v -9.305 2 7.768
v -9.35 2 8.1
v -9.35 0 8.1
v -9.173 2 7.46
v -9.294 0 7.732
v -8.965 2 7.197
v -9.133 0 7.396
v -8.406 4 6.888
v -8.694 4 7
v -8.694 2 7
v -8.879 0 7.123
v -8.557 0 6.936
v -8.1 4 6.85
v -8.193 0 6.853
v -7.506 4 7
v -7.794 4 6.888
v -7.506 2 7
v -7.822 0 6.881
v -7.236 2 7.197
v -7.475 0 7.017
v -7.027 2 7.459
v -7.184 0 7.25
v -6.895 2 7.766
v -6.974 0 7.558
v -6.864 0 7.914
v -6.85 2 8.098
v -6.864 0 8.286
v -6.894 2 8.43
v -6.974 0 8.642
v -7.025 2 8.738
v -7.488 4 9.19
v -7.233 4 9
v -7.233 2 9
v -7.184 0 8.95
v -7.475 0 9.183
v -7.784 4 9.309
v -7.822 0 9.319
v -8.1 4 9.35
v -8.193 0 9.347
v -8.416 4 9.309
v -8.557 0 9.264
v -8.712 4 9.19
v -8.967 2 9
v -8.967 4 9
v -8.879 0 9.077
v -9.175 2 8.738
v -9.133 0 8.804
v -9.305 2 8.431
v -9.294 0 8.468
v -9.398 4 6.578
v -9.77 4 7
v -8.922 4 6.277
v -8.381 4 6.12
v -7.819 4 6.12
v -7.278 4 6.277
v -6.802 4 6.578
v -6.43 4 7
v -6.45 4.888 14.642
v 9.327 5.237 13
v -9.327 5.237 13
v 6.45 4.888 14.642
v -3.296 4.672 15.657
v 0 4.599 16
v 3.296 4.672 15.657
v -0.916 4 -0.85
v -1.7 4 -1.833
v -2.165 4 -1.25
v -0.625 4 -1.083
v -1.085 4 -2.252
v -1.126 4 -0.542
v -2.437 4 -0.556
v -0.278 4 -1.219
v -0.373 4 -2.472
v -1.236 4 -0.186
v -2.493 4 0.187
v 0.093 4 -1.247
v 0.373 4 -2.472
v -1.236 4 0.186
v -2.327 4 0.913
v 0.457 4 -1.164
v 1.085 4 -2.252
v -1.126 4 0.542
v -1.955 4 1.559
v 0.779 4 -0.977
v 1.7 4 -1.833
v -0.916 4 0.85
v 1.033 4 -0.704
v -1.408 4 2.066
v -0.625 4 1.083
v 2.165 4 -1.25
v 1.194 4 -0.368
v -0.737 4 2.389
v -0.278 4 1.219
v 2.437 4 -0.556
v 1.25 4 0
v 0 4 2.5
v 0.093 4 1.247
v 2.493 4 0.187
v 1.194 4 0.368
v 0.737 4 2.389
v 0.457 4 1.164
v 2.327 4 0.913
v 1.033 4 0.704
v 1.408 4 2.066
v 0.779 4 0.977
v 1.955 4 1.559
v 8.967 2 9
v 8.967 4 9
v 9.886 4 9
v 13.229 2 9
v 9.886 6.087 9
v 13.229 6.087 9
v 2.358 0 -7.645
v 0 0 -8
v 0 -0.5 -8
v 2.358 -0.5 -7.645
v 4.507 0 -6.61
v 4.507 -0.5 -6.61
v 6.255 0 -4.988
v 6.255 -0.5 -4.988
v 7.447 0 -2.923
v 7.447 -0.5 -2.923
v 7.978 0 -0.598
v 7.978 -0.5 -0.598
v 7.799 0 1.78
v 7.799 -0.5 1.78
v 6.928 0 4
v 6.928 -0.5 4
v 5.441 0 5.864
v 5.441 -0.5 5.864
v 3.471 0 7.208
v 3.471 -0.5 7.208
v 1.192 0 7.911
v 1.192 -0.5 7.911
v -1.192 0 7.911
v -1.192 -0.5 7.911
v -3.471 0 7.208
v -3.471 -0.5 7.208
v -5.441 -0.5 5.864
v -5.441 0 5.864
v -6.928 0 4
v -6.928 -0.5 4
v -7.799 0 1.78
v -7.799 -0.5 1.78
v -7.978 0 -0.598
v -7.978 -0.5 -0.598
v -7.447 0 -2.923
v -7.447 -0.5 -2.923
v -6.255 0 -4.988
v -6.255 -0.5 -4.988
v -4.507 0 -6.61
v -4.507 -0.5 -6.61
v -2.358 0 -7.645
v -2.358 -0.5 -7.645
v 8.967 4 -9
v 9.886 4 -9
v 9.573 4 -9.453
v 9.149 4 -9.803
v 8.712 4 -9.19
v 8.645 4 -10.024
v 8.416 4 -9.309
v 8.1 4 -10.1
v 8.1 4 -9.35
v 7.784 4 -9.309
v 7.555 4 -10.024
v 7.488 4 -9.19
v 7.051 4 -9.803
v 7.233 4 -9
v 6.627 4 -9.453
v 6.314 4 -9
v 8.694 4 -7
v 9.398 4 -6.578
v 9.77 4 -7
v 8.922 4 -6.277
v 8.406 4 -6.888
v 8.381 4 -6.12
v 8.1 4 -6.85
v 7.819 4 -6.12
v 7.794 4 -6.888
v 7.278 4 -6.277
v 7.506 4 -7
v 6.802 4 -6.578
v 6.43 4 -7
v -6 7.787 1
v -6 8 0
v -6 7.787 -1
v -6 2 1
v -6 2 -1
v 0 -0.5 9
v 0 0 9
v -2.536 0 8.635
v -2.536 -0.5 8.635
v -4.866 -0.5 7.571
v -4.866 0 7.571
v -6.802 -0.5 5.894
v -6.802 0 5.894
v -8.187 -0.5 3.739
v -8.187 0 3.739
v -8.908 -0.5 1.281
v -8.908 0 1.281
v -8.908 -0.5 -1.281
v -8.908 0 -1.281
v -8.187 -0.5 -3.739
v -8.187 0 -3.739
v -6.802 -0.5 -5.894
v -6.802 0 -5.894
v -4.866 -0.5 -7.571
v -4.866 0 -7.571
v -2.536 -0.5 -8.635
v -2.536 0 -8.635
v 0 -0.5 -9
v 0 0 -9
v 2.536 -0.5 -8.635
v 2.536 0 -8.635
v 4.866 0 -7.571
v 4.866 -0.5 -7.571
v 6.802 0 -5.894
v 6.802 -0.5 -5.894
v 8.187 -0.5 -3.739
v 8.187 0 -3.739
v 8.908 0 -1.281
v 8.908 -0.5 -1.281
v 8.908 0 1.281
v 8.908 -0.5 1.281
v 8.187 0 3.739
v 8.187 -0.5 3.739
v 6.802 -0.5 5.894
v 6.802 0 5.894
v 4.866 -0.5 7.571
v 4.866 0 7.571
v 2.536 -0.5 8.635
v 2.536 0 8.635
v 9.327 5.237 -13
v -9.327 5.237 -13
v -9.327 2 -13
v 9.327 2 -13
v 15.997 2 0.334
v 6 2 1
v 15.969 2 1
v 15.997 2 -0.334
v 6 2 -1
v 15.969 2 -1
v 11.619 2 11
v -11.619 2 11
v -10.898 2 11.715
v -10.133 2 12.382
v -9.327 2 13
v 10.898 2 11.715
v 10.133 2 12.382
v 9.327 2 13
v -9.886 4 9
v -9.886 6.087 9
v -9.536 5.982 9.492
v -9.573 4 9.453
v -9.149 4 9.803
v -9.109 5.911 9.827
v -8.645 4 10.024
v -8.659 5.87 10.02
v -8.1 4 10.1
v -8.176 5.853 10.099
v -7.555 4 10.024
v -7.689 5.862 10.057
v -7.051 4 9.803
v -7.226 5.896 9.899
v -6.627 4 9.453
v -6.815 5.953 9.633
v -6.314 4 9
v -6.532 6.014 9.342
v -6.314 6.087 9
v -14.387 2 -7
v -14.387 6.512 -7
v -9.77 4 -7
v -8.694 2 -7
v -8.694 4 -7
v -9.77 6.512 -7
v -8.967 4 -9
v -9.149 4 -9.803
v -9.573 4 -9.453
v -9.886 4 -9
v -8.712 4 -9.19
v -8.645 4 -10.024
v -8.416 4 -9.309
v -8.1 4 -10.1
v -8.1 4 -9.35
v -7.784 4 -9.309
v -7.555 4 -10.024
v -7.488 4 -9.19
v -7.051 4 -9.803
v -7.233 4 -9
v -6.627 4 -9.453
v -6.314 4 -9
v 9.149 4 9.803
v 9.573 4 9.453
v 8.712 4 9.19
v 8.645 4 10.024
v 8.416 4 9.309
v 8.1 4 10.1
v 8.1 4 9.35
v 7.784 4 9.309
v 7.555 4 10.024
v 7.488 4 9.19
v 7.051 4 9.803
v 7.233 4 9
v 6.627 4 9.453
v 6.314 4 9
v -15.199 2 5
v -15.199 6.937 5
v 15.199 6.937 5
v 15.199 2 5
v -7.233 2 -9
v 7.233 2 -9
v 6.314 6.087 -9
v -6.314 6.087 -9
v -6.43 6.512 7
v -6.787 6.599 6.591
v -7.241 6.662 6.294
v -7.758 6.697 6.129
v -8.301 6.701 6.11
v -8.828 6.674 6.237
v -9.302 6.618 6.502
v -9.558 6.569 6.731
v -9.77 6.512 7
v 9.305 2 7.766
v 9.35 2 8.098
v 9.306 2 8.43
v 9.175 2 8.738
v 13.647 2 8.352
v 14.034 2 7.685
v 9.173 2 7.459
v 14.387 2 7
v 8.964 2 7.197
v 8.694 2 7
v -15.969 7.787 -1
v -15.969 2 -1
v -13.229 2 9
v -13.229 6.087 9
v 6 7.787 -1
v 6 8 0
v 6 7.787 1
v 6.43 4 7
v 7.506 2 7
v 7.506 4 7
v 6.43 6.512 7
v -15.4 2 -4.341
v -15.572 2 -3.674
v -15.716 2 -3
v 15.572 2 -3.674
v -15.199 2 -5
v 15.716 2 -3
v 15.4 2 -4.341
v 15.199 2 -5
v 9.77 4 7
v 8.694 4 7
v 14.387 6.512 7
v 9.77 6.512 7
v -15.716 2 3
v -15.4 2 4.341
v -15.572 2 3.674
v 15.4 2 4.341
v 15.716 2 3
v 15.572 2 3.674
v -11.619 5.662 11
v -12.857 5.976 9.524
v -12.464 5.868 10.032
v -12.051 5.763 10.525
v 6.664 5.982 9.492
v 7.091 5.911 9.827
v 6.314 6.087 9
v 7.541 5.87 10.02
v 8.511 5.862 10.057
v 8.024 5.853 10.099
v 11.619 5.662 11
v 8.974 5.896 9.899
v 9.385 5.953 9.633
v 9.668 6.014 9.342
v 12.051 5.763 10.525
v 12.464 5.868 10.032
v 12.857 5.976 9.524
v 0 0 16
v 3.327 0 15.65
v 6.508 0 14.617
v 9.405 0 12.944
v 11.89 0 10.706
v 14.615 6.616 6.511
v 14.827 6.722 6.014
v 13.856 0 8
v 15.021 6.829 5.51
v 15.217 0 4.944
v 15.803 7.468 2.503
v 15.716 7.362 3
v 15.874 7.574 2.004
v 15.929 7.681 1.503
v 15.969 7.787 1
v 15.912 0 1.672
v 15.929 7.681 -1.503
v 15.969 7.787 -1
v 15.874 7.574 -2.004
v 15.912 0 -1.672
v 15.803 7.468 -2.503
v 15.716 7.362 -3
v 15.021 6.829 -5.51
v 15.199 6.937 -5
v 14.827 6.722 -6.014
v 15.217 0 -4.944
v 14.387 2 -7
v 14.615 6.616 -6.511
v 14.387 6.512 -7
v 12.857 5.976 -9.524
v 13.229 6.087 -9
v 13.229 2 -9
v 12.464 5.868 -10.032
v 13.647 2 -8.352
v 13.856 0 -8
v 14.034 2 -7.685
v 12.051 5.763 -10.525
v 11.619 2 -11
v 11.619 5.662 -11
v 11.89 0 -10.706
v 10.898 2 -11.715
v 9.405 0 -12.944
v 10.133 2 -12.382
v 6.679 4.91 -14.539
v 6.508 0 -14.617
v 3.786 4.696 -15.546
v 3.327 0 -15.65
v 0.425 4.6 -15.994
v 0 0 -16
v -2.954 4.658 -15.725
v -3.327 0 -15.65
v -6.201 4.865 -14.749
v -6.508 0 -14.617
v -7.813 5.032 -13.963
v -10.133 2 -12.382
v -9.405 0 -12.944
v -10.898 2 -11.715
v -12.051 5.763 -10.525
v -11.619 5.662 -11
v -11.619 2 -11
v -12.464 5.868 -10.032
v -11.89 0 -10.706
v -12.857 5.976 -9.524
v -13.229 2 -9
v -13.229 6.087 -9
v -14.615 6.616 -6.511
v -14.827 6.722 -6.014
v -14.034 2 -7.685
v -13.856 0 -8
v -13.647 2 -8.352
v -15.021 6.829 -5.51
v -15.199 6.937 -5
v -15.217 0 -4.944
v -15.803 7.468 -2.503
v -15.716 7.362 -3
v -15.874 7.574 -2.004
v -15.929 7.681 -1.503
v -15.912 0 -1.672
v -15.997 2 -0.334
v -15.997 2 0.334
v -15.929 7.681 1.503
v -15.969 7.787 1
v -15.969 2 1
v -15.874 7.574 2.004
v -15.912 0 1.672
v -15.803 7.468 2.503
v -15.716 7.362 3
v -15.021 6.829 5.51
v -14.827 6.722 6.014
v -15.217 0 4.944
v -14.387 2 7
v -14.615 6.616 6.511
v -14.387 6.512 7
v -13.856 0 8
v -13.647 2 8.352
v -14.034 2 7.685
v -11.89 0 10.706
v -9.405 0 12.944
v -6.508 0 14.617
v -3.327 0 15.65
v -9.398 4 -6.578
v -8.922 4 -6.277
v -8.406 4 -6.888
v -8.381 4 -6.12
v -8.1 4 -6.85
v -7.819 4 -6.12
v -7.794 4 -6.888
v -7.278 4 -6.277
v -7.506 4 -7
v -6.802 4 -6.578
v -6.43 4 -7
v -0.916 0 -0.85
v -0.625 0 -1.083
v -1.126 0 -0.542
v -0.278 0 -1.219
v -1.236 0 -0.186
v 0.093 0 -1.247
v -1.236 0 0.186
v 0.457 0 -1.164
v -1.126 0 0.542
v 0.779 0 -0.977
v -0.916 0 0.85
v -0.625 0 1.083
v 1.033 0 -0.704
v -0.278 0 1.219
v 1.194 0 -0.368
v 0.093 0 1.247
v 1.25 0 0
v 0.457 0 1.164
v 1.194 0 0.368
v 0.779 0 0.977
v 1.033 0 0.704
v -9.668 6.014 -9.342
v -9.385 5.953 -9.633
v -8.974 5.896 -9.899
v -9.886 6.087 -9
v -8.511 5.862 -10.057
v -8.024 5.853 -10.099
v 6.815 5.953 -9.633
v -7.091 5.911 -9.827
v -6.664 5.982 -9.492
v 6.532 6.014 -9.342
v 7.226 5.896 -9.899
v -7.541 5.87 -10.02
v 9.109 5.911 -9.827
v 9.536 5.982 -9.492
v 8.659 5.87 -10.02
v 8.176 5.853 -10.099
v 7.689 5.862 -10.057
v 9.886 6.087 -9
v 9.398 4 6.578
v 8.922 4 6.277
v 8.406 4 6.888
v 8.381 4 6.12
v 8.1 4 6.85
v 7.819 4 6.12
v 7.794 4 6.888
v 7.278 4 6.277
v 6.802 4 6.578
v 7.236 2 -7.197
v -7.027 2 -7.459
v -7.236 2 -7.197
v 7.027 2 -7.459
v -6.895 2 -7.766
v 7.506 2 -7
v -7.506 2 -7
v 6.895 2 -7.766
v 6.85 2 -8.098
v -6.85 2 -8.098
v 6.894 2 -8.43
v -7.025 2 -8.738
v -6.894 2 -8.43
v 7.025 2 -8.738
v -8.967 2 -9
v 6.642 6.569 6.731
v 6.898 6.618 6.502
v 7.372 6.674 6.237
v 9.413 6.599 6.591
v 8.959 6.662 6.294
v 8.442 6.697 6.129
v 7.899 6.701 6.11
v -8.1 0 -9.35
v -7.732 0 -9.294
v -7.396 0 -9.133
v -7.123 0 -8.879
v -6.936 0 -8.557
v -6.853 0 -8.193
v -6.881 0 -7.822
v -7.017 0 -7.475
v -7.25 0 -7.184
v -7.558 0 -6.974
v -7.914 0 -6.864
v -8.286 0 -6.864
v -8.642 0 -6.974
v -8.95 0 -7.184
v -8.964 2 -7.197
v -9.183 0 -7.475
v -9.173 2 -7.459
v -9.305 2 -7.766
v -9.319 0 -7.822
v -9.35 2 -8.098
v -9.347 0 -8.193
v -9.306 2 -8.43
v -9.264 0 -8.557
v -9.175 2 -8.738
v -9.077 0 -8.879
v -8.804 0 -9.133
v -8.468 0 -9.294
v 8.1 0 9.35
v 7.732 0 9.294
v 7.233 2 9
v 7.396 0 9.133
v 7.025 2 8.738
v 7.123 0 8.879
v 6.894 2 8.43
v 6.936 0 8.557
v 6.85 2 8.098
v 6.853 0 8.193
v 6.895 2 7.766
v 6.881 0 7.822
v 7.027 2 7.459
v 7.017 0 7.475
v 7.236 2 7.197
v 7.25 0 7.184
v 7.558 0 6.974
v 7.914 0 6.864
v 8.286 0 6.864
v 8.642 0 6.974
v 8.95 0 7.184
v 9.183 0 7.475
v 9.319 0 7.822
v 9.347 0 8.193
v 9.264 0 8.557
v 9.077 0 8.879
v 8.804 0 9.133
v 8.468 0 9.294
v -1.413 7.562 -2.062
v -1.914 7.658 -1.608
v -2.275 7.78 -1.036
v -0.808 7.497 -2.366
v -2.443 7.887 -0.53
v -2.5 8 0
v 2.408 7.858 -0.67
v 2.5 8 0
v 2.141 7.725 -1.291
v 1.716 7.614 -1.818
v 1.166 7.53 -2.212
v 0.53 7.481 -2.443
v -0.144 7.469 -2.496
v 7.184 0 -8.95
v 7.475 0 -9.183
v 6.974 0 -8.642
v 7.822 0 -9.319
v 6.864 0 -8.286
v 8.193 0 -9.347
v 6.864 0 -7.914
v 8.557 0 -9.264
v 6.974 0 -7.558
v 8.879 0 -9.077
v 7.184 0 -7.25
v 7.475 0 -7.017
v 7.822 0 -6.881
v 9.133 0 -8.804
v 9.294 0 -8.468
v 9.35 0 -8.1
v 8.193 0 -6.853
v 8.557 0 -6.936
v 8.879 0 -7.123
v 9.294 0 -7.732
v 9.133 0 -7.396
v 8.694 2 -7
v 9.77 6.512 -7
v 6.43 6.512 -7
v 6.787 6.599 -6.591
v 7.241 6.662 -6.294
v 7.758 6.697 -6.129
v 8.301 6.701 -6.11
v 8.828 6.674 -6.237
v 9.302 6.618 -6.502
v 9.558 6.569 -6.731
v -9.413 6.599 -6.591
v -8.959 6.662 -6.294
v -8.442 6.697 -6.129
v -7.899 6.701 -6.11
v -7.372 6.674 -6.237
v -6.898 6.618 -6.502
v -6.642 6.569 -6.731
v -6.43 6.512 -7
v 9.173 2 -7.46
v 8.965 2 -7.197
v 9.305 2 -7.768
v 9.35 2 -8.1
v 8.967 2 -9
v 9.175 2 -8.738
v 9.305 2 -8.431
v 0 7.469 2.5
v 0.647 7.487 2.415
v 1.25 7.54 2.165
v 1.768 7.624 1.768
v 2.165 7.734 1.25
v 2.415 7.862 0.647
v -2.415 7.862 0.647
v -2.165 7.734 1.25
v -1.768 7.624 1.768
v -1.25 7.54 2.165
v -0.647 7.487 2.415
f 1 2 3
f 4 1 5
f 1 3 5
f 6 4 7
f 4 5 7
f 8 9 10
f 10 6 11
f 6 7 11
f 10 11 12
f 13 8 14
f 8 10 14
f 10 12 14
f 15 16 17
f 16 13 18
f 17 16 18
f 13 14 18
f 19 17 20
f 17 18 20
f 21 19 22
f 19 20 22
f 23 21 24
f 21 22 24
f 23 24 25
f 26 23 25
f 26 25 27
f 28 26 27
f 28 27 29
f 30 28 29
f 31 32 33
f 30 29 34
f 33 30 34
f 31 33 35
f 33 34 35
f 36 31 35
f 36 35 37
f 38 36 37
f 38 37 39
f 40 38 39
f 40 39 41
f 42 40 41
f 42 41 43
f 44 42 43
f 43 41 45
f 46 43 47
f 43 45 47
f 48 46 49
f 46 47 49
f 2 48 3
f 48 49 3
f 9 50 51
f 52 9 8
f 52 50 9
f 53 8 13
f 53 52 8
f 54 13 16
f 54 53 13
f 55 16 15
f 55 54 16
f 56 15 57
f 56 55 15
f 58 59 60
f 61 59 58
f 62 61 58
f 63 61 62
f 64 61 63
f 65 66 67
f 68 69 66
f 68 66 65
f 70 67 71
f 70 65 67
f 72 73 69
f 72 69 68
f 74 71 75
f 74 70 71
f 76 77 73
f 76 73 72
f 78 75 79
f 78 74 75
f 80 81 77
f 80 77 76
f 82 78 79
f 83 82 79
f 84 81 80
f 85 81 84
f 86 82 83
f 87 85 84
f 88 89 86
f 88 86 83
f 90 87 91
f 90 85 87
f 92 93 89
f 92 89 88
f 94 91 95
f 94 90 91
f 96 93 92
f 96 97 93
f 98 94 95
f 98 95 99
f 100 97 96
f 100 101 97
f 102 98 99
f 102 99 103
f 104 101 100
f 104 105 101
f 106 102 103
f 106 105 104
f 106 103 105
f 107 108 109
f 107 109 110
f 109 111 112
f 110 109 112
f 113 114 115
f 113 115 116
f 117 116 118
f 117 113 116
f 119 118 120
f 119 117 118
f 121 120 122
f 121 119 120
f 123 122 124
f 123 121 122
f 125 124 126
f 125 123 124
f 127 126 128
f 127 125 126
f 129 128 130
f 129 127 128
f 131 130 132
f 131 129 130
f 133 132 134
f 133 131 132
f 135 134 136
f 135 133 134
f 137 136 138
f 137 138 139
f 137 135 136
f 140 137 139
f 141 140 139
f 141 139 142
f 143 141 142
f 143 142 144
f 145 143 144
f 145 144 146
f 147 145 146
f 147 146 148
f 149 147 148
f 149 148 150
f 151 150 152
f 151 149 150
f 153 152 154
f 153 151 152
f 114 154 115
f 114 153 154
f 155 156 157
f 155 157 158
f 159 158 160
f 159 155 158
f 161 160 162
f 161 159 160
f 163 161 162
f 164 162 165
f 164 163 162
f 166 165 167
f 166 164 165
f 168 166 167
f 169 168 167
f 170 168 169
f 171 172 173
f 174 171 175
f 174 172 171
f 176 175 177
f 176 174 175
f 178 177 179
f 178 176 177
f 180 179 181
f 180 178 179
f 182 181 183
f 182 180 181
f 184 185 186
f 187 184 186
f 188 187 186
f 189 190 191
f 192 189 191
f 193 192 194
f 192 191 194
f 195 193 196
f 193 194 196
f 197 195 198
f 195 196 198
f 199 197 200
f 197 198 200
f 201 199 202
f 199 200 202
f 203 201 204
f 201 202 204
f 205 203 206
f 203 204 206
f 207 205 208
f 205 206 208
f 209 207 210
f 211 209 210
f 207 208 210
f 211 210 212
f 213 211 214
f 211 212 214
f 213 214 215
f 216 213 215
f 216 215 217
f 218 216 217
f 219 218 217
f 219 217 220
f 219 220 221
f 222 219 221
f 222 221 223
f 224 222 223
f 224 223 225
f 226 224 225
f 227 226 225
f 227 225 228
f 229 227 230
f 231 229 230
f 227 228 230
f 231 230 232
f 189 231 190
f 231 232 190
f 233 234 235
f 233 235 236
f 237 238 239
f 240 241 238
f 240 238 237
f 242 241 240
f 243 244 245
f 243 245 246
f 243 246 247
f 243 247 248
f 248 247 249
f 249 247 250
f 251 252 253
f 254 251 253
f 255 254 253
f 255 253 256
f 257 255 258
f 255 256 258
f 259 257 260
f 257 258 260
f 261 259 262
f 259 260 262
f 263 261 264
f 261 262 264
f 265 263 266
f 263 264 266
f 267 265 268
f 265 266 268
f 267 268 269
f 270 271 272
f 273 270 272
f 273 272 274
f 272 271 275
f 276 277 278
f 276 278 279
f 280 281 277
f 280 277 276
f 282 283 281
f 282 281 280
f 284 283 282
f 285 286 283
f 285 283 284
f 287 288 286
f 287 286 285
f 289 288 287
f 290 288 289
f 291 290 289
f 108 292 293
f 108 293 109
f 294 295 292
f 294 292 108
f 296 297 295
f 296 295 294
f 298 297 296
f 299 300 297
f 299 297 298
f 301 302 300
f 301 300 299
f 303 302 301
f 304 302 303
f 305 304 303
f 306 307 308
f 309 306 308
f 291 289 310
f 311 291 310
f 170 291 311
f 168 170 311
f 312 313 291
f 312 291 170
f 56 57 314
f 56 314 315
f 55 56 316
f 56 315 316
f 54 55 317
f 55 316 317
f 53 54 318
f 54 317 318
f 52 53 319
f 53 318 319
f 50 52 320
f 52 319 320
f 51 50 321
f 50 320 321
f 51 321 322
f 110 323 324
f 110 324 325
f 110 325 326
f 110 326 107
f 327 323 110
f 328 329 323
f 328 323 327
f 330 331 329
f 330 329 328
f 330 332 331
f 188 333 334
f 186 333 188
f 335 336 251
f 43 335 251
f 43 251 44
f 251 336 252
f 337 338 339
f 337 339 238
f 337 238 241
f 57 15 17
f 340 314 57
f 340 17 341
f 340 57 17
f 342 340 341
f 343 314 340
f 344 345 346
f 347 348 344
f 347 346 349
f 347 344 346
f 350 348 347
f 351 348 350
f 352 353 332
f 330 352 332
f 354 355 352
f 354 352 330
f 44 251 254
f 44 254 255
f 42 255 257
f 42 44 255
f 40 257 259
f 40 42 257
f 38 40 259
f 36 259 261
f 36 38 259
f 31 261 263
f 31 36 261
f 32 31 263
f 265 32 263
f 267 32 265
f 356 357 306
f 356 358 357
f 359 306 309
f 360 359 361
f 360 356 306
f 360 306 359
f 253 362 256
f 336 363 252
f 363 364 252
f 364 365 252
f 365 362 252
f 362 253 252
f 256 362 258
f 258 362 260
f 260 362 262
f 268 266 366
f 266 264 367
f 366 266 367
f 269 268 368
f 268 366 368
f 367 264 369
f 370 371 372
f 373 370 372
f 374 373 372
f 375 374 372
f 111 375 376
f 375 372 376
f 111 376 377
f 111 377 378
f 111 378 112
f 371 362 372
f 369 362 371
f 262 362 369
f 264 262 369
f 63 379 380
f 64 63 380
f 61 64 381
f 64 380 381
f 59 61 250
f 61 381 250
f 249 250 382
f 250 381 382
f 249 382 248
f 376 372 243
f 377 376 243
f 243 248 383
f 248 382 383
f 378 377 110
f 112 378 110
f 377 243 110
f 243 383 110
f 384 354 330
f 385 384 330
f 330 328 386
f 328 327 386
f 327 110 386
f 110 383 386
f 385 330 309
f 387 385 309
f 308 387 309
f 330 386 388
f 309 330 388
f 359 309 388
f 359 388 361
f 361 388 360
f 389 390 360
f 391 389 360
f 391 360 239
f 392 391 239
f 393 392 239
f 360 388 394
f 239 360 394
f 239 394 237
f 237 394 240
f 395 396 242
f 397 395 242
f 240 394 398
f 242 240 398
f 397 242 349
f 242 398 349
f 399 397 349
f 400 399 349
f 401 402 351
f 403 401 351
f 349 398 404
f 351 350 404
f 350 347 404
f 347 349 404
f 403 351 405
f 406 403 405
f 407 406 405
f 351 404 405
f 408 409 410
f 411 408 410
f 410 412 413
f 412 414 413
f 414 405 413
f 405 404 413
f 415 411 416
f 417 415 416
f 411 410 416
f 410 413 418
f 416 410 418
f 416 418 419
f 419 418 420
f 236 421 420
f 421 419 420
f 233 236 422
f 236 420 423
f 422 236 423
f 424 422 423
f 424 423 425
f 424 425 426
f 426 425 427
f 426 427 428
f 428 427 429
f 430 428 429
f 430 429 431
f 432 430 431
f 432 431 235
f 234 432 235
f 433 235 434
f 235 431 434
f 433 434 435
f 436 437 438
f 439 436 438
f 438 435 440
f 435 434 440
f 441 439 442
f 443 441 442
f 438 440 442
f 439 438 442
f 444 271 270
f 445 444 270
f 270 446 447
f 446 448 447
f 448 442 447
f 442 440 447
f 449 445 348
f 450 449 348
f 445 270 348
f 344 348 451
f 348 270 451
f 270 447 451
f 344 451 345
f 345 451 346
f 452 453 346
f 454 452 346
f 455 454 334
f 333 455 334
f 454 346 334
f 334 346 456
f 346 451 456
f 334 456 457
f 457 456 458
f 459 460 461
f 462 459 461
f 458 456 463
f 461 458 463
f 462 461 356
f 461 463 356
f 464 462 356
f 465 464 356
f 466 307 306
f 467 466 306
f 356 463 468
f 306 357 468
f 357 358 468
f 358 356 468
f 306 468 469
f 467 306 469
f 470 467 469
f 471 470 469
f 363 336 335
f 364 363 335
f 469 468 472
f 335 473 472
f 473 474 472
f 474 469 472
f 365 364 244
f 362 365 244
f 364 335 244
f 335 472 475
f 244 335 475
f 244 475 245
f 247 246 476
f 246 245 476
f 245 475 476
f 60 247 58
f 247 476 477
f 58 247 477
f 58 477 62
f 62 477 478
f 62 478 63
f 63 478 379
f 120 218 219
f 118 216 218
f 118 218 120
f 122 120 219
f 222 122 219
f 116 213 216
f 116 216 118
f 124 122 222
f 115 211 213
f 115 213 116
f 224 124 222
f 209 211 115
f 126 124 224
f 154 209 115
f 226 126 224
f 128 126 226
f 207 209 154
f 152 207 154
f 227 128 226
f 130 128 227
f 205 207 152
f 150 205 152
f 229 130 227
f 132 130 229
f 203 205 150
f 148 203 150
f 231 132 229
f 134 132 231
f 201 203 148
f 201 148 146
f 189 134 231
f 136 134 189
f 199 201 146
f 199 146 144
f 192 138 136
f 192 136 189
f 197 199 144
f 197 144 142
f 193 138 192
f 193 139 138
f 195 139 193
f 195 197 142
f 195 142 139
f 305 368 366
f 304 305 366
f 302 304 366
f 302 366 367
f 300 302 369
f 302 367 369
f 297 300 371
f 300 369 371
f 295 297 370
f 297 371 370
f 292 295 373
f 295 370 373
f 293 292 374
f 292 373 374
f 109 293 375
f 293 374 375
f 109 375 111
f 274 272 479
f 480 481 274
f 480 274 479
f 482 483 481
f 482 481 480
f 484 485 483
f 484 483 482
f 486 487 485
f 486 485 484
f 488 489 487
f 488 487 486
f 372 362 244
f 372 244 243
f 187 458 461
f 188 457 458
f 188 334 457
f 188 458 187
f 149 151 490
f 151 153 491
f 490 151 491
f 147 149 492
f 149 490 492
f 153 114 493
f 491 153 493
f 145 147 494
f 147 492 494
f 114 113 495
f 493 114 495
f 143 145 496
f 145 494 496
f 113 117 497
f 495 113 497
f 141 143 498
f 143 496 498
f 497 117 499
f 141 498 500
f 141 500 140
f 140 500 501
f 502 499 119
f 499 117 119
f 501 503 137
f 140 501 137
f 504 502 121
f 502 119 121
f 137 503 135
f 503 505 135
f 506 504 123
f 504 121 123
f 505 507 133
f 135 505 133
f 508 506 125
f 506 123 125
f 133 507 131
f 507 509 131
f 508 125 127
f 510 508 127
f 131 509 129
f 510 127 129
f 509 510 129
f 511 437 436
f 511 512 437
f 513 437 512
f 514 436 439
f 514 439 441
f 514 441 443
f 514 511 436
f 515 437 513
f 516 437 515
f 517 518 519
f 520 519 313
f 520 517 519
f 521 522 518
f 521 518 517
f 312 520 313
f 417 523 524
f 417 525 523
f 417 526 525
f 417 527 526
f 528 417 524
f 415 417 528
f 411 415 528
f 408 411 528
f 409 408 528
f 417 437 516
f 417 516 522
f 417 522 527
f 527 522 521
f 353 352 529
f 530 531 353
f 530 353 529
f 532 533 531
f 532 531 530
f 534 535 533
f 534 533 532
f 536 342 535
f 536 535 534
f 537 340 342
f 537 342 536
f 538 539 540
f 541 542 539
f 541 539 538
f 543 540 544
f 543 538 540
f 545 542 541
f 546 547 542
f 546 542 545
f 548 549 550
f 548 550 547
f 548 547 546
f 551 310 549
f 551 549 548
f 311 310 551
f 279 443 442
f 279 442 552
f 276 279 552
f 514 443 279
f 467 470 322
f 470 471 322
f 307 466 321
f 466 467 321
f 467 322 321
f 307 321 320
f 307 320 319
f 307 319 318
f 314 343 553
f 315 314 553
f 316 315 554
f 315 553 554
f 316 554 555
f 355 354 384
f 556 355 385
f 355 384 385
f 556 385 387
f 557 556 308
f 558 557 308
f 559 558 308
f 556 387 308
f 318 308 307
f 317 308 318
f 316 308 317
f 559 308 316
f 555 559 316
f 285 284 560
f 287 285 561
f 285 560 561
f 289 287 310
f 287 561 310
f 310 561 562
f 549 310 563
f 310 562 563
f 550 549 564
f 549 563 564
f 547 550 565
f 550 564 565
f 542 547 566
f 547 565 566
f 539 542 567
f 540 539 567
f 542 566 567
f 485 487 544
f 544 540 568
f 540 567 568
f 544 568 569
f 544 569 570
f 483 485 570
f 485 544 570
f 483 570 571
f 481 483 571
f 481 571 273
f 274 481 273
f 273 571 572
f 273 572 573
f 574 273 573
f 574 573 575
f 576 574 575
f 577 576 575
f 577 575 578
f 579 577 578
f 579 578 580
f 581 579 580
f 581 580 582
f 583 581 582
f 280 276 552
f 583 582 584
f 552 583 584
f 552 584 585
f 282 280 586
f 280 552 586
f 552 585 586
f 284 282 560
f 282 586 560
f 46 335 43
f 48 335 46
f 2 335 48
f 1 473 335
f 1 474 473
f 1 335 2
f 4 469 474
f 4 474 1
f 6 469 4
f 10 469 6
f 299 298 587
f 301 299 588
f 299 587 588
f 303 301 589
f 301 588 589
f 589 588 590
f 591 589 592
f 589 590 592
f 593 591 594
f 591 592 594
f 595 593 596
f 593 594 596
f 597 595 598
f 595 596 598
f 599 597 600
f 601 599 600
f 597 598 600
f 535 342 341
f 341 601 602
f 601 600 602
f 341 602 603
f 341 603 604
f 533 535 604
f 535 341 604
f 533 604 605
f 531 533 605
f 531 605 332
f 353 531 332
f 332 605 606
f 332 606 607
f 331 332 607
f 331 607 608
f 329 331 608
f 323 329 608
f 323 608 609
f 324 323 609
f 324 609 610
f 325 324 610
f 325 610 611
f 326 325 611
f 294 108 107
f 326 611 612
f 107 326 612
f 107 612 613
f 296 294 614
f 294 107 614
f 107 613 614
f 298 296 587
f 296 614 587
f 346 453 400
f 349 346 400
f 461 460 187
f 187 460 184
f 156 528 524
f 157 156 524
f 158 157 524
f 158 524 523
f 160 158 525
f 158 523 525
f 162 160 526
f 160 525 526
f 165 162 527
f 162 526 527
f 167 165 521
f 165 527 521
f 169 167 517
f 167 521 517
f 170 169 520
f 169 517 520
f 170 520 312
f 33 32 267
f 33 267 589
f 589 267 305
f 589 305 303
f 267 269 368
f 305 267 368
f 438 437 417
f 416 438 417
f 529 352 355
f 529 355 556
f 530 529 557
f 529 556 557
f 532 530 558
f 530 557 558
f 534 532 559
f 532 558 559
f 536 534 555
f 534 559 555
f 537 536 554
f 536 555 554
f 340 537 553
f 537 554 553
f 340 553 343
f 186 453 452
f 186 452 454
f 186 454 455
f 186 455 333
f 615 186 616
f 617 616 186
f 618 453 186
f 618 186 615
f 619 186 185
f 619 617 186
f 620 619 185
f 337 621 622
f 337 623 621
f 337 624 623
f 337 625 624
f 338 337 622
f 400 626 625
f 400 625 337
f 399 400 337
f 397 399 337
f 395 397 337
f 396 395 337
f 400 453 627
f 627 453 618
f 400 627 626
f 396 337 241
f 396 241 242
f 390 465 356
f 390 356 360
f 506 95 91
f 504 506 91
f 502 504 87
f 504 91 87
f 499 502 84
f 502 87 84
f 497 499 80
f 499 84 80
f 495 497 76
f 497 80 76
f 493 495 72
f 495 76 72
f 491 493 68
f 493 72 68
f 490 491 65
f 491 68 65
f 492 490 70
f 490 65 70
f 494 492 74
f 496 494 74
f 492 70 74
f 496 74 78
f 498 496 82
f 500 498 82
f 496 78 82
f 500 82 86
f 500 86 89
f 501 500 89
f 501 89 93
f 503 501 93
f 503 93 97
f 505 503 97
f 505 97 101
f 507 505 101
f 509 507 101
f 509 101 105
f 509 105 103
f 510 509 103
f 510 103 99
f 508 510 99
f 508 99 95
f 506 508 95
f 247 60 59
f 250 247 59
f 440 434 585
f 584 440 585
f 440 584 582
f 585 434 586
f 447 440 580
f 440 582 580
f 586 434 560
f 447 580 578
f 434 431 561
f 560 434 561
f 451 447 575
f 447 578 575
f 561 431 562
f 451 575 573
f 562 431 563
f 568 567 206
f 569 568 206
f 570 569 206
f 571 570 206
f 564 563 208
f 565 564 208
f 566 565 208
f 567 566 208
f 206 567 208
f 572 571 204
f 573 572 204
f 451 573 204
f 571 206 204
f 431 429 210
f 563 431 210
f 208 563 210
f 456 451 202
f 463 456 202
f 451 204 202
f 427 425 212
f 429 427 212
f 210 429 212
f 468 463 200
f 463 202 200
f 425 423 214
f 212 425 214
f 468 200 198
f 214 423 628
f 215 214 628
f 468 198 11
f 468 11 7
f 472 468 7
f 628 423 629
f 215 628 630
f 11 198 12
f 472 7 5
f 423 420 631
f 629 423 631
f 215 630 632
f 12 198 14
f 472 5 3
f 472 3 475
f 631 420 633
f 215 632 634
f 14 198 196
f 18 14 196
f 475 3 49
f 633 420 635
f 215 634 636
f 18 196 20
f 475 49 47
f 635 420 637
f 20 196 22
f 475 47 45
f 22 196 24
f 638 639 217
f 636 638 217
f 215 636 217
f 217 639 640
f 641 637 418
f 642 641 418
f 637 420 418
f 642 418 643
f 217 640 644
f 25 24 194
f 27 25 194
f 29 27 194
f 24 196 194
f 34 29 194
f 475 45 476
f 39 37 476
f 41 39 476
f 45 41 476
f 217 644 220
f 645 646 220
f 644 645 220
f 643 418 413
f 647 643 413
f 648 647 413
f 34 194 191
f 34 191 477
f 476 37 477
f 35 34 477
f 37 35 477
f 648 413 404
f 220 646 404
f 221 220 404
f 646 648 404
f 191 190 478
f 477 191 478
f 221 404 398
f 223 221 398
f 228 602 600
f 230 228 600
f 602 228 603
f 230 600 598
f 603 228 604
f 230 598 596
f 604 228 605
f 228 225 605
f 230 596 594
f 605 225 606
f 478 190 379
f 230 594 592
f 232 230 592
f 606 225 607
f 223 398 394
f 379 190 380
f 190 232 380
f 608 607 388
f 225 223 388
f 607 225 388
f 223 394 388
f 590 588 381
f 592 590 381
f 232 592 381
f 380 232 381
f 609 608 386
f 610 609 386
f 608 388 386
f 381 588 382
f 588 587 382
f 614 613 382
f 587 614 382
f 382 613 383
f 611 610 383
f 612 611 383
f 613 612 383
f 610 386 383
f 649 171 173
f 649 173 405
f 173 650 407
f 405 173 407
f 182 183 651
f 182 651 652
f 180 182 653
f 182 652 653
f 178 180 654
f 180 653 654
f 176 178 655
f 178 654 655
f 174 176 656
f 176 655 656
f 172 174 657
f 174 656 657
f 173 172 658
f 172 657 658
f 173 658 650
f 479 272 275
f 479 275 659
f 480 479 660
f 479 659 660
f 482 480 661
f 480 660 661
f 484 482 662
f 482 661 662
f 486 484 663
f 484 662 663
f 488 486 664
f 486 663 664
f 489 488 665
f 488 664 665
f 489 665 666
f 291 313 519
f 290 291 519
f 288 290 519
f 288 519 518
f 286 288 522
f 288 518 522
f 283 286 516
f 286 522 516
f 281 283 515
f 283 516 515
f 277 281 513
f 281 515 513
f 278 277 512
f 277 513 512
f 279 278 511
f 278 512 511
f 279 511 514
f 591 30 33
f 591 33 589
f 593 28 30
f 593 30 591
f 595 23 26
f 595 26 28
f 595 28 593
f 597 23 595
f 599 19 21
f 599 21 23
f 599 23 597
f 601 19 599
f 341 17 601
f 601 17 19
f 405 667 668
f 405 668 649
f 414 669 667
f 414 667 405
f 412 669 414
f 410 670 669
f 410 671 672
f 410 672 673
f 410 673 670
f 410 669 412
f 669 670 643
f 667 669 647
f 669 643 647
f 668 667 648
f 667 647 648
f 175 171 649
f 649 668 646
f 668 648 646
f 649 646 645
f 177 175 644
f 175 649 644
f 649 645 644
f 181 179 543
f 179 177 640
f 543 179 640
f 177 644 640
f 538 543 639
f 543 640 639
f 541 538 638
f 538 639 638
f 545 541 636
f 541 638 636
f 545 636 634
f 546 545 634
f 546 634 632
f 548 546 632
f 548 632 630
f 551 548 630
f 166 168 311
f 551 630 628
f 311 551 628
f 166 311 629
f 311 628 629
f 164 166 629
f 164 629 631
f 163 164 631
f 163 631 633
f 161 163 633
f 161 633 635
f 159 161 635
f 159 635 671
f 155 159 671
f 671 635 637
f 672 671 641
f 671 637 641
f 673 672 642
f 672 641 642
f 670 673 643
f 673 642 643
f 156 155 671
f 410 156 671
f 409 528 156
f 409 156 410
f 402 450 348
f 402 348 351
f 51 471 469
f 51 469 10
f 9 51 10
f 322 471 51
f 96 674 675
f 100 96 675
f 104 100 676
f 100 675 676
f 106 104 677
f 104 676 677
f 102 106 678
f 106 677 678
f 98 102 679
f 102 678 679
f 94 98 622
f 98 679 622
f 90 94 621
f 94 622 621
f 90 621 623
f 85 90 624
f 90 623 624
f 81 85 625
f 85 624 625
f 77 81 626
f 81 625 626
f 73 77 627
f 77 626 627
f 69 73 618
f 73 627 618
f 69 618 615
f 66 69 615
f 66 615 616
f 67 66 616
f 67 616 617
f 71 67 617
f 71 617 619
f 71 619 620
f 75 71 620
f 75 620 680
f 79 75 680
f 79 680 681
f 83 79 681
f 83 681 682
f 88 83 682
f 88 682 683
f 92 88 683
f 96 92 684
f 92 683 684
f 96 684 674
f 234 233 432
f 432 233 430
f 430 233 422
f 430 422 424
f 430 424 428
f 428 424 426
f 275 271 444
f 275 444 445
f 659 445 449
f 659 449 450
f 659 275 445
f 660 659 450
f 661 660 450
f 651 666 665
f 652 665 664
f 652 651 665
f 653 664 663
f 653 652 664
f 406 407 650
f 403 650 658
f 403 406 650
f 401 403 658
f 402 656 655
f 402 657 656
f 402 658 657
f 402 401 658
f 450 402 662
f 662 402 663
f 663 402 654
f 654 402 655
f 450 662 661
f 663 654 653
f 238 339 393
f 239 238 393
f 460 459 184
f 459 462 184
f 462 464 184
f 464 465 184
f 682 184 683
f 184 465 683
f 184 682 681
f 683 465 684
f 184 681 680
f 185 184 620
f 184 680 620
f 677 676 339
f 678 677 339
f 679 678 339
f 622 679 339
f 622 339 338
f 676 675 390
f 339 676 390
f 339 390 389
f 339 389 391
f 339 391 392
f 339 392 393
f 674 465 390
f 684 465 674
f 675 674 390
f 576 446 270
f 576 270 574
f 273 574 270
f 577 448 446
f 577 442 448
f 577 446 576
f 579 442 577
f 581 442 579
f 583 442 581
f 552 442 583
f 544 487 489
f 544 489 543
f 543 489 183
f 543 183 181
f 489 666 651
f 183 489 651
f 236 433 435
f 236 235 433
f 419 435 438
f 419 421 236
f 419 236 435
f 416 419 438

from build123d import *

# Parameters (mm, degrees)
SKETCH2_R                                        = 16
BOSS_EXTRUDE1_DEPTH                              = 8
SKETCH3_W                                        = 27.624731793
SKETCH3_H                                        = 2
SKETCH3_W_2                                      = 37.15735793
SKETCH3_W_3                                      = 33.69266167
SKETCH3_W_4                                      = 12.751314483
CUT_EXTRUDE1_DEPTH                               = 6
SKETCH4_R                                        = 2.5
CUT_EXTRUDE2_DEPTH                               = 4
TAP_DRILL_FOR_M3X0_5_TAP1_D                      = 2.5
TAP_DRILL_FOR_M3X0_5_TAP1_DEPTH                  = 5.5
TAP_DRILL_FOR_M3X0_5_TAP1_TIP                    = 0.751075774
SKETCH8_R                                        = 9
SKETCH8_R_2                                      = 8
BOSS_EXTRUDE2_DEPTH                              = 0.5
CBORE_FOR_M4_PAN_HEAD_MACHINE_SCREW1_D           = 2.5
CBORE_FOR_M4_PAN_HEAD_MACHINE_SCREW1_DEPTH       = 8.001
CBORE_FOR_M4_PAN_HEAD_MACHINE_SCREW1_CBORE_D     = 4
CBORE_FOR_M4_PAN_HEAD_MACHINE_SCREW1_CBORE_DEPTH = 4
CIRPATTERN1_COUNT                                = 4
CUT_EXTRUDE3_DEPTH                               = 20.25


with BuildPart() as part:
    # Sketch2 → Boss-Extrude1 (new body)
    with BuildSketch(Plane(origin=(0, 0, 0), x_dir=(1, 0, 0), z_dir=(0, 1, 0))):
        with Locations(Location((0, 0, 0), (0, 0, 270))):  # turned: the seam where the file's is
            Circle(SKETCH2_R)
    extrude(amount=BOSS_EXTRUDE1_DEPTH)

    # Sketch3 → Cut-Extrude1 (cut)
    with BuildSketch(Plane(origin=(0, 8, 0), x_dir=(1, 0, 0), z_dir=(0, 1, 0))):
        with Locations((0.605596929, -12)):
            Rectangle(SKETCH3_W, SKETCH3_H)
        with Locations((-0.172635518, 4)):
            Rectangle(SKETCH3_W_2, SKETCH3_H)
        with Locations((-0.604755395, 8)):
            Rectangle(SKETCH3_W_3, SKETCH3_H)
        with Locations((0.605596929, 12)):
            Rectangle(SKETCH3_W, SKETCH3_H)
        with Locations((-0.604755395, -8)):
            Rectangle(SKETCH3_W_3, SKETCH3_H)
        with Locations((-0.172635518, -4)):
            Rectangle(SKETCH3_W_2, SKETCH3_H)
        with Locations((-12.375657242, 0)):
            Rectangle(SKETCH3_W_4, SKETCH3_H)
        with Locations((12.375657242, 0)):
            Rectangle(SKETCH3_W_4, SKETCH3_H)
    extrude(amount=-CUT_EXTRUDE1_DEPTH, mode=Mode.SUBTRACT)

    # Sketch4 → Cut-Extrude2 (cut)
    with BuildSketch(Plane(origin=(0, 8, 0), x_dir=(1, 0, 0), z_dir=(0, 1, 0))):
        with Locations(Location((0, 0, 0), (0, 0, 270))):  # turned: the seam where the file's is
            Circle(SKETCH4_R)
    extrude(amount=-CUT_EXTRUDE2_DEPTH, mode=Mode.SUBTRACT)

    # Tap Drill for M3x0.5 Tap1
    with Locations(Plane(origin=(0, 0, 0), x_dir=(-1, 0, 0), z_dir=(0, -1, 0))):
        with Locations((0, 0)):
            Hole(TAP_DRILL_FOR_M3X0_5_TAP1_D / 2, depth=TAP_DRILL_FOR_M3X0_5_TAP1_DEPTH)
            with Locations((0, 0, -(TAP_DRILL_FOR_M3X0_5_TAP1_DEPTH + TAP_DRILL_FOR_M3X0_5_TAP1_TIP / 2))):  # 118° drill point
                Cone(0, TAP_DRILL_FOR_M3X0_5_TAP1_D / 2, TAP_DRILL_FOR_M3X0_5_TAP1_TIP, mode=Mode.SUBTRACT)

    # Sketch8 → Boss-Extrude2 (add)
    with BuildSketch(Plane.XZ):
        with Locations(Location((0, 0, 0), (0, 0, 90))):  # turned: the seam where the file's is
            Circle(SKETCH8_R)
        with Locations(Location((0, 0, 0), (0, 0, 270))):  # turned: the seam where the file's is
            Circle(SKETCH8_R_2, mode=Mode.SUBTRACT)
    extrude(amount=BOSS_EXTRUDE2_DEPTH)

    # CBORE for M4 Pan Head Machine Screw1
    with Locations(Plane(origin=(0, 8, 0), x_dir=(1, 0, 0), z_dir=(0, 1, 0))):
        with Locations((-8.1, -8.1)):
            cbore_for_m4_pan_head_machine_screw1 = CounterBoreHole(CBORE_FOR_M4_PAN_HEAD_MACHINE_SCREW1_D / 2, CBORE_FOR_M4_PAN_HEAD_MACHINE_SCREW1_CBORE_D / 2, CBORE_FOR_M4_PAN_HEAD_MACHINE_SCREW1_CBORE_DEPTH, depth=CBORE_FOR_M4_PAN_HEAD_MACHINE_SCREW1_DEPTH)

    # CirPattern1: CBORE for M4 Pan Head Machine Screw1 ×4 about axis
    cirpattern1_axis = Axis((0, 0, 0), (0, 1, 0))
    for i in range(1, CIRPATTERN1_COUNT):
        add(cbore_for_m4_pan_head_machine_screw1.rotate(cirpattern1_axis, i * 360 / CIRPATTERN1_COUNT), mode=Mode.SUBTRACT)

    # Sketch12 → Cut-Extrude3 (cut, symmetric)
    with BuildSketch(Plane(origin=(0, 0, 0), x_dir=(0, 0, -1), z_dir=(1, 0, 0))):
        Polygon((0, 8), (16, 8), (17.032384138, 8), (17.032384138, 4.379654991), align=None)
    cut_extrude3 = extrude(amount=CUT_EXTRUDE3_DEPTH, both=True, mode=Mode.SUBTRACT)

    # Mirror1: Cut-Extrude3 across plane
    add(cut_extrude3.mirror(Plane.XY), mode=Mode.SUBTRACT)


solid = part.part
